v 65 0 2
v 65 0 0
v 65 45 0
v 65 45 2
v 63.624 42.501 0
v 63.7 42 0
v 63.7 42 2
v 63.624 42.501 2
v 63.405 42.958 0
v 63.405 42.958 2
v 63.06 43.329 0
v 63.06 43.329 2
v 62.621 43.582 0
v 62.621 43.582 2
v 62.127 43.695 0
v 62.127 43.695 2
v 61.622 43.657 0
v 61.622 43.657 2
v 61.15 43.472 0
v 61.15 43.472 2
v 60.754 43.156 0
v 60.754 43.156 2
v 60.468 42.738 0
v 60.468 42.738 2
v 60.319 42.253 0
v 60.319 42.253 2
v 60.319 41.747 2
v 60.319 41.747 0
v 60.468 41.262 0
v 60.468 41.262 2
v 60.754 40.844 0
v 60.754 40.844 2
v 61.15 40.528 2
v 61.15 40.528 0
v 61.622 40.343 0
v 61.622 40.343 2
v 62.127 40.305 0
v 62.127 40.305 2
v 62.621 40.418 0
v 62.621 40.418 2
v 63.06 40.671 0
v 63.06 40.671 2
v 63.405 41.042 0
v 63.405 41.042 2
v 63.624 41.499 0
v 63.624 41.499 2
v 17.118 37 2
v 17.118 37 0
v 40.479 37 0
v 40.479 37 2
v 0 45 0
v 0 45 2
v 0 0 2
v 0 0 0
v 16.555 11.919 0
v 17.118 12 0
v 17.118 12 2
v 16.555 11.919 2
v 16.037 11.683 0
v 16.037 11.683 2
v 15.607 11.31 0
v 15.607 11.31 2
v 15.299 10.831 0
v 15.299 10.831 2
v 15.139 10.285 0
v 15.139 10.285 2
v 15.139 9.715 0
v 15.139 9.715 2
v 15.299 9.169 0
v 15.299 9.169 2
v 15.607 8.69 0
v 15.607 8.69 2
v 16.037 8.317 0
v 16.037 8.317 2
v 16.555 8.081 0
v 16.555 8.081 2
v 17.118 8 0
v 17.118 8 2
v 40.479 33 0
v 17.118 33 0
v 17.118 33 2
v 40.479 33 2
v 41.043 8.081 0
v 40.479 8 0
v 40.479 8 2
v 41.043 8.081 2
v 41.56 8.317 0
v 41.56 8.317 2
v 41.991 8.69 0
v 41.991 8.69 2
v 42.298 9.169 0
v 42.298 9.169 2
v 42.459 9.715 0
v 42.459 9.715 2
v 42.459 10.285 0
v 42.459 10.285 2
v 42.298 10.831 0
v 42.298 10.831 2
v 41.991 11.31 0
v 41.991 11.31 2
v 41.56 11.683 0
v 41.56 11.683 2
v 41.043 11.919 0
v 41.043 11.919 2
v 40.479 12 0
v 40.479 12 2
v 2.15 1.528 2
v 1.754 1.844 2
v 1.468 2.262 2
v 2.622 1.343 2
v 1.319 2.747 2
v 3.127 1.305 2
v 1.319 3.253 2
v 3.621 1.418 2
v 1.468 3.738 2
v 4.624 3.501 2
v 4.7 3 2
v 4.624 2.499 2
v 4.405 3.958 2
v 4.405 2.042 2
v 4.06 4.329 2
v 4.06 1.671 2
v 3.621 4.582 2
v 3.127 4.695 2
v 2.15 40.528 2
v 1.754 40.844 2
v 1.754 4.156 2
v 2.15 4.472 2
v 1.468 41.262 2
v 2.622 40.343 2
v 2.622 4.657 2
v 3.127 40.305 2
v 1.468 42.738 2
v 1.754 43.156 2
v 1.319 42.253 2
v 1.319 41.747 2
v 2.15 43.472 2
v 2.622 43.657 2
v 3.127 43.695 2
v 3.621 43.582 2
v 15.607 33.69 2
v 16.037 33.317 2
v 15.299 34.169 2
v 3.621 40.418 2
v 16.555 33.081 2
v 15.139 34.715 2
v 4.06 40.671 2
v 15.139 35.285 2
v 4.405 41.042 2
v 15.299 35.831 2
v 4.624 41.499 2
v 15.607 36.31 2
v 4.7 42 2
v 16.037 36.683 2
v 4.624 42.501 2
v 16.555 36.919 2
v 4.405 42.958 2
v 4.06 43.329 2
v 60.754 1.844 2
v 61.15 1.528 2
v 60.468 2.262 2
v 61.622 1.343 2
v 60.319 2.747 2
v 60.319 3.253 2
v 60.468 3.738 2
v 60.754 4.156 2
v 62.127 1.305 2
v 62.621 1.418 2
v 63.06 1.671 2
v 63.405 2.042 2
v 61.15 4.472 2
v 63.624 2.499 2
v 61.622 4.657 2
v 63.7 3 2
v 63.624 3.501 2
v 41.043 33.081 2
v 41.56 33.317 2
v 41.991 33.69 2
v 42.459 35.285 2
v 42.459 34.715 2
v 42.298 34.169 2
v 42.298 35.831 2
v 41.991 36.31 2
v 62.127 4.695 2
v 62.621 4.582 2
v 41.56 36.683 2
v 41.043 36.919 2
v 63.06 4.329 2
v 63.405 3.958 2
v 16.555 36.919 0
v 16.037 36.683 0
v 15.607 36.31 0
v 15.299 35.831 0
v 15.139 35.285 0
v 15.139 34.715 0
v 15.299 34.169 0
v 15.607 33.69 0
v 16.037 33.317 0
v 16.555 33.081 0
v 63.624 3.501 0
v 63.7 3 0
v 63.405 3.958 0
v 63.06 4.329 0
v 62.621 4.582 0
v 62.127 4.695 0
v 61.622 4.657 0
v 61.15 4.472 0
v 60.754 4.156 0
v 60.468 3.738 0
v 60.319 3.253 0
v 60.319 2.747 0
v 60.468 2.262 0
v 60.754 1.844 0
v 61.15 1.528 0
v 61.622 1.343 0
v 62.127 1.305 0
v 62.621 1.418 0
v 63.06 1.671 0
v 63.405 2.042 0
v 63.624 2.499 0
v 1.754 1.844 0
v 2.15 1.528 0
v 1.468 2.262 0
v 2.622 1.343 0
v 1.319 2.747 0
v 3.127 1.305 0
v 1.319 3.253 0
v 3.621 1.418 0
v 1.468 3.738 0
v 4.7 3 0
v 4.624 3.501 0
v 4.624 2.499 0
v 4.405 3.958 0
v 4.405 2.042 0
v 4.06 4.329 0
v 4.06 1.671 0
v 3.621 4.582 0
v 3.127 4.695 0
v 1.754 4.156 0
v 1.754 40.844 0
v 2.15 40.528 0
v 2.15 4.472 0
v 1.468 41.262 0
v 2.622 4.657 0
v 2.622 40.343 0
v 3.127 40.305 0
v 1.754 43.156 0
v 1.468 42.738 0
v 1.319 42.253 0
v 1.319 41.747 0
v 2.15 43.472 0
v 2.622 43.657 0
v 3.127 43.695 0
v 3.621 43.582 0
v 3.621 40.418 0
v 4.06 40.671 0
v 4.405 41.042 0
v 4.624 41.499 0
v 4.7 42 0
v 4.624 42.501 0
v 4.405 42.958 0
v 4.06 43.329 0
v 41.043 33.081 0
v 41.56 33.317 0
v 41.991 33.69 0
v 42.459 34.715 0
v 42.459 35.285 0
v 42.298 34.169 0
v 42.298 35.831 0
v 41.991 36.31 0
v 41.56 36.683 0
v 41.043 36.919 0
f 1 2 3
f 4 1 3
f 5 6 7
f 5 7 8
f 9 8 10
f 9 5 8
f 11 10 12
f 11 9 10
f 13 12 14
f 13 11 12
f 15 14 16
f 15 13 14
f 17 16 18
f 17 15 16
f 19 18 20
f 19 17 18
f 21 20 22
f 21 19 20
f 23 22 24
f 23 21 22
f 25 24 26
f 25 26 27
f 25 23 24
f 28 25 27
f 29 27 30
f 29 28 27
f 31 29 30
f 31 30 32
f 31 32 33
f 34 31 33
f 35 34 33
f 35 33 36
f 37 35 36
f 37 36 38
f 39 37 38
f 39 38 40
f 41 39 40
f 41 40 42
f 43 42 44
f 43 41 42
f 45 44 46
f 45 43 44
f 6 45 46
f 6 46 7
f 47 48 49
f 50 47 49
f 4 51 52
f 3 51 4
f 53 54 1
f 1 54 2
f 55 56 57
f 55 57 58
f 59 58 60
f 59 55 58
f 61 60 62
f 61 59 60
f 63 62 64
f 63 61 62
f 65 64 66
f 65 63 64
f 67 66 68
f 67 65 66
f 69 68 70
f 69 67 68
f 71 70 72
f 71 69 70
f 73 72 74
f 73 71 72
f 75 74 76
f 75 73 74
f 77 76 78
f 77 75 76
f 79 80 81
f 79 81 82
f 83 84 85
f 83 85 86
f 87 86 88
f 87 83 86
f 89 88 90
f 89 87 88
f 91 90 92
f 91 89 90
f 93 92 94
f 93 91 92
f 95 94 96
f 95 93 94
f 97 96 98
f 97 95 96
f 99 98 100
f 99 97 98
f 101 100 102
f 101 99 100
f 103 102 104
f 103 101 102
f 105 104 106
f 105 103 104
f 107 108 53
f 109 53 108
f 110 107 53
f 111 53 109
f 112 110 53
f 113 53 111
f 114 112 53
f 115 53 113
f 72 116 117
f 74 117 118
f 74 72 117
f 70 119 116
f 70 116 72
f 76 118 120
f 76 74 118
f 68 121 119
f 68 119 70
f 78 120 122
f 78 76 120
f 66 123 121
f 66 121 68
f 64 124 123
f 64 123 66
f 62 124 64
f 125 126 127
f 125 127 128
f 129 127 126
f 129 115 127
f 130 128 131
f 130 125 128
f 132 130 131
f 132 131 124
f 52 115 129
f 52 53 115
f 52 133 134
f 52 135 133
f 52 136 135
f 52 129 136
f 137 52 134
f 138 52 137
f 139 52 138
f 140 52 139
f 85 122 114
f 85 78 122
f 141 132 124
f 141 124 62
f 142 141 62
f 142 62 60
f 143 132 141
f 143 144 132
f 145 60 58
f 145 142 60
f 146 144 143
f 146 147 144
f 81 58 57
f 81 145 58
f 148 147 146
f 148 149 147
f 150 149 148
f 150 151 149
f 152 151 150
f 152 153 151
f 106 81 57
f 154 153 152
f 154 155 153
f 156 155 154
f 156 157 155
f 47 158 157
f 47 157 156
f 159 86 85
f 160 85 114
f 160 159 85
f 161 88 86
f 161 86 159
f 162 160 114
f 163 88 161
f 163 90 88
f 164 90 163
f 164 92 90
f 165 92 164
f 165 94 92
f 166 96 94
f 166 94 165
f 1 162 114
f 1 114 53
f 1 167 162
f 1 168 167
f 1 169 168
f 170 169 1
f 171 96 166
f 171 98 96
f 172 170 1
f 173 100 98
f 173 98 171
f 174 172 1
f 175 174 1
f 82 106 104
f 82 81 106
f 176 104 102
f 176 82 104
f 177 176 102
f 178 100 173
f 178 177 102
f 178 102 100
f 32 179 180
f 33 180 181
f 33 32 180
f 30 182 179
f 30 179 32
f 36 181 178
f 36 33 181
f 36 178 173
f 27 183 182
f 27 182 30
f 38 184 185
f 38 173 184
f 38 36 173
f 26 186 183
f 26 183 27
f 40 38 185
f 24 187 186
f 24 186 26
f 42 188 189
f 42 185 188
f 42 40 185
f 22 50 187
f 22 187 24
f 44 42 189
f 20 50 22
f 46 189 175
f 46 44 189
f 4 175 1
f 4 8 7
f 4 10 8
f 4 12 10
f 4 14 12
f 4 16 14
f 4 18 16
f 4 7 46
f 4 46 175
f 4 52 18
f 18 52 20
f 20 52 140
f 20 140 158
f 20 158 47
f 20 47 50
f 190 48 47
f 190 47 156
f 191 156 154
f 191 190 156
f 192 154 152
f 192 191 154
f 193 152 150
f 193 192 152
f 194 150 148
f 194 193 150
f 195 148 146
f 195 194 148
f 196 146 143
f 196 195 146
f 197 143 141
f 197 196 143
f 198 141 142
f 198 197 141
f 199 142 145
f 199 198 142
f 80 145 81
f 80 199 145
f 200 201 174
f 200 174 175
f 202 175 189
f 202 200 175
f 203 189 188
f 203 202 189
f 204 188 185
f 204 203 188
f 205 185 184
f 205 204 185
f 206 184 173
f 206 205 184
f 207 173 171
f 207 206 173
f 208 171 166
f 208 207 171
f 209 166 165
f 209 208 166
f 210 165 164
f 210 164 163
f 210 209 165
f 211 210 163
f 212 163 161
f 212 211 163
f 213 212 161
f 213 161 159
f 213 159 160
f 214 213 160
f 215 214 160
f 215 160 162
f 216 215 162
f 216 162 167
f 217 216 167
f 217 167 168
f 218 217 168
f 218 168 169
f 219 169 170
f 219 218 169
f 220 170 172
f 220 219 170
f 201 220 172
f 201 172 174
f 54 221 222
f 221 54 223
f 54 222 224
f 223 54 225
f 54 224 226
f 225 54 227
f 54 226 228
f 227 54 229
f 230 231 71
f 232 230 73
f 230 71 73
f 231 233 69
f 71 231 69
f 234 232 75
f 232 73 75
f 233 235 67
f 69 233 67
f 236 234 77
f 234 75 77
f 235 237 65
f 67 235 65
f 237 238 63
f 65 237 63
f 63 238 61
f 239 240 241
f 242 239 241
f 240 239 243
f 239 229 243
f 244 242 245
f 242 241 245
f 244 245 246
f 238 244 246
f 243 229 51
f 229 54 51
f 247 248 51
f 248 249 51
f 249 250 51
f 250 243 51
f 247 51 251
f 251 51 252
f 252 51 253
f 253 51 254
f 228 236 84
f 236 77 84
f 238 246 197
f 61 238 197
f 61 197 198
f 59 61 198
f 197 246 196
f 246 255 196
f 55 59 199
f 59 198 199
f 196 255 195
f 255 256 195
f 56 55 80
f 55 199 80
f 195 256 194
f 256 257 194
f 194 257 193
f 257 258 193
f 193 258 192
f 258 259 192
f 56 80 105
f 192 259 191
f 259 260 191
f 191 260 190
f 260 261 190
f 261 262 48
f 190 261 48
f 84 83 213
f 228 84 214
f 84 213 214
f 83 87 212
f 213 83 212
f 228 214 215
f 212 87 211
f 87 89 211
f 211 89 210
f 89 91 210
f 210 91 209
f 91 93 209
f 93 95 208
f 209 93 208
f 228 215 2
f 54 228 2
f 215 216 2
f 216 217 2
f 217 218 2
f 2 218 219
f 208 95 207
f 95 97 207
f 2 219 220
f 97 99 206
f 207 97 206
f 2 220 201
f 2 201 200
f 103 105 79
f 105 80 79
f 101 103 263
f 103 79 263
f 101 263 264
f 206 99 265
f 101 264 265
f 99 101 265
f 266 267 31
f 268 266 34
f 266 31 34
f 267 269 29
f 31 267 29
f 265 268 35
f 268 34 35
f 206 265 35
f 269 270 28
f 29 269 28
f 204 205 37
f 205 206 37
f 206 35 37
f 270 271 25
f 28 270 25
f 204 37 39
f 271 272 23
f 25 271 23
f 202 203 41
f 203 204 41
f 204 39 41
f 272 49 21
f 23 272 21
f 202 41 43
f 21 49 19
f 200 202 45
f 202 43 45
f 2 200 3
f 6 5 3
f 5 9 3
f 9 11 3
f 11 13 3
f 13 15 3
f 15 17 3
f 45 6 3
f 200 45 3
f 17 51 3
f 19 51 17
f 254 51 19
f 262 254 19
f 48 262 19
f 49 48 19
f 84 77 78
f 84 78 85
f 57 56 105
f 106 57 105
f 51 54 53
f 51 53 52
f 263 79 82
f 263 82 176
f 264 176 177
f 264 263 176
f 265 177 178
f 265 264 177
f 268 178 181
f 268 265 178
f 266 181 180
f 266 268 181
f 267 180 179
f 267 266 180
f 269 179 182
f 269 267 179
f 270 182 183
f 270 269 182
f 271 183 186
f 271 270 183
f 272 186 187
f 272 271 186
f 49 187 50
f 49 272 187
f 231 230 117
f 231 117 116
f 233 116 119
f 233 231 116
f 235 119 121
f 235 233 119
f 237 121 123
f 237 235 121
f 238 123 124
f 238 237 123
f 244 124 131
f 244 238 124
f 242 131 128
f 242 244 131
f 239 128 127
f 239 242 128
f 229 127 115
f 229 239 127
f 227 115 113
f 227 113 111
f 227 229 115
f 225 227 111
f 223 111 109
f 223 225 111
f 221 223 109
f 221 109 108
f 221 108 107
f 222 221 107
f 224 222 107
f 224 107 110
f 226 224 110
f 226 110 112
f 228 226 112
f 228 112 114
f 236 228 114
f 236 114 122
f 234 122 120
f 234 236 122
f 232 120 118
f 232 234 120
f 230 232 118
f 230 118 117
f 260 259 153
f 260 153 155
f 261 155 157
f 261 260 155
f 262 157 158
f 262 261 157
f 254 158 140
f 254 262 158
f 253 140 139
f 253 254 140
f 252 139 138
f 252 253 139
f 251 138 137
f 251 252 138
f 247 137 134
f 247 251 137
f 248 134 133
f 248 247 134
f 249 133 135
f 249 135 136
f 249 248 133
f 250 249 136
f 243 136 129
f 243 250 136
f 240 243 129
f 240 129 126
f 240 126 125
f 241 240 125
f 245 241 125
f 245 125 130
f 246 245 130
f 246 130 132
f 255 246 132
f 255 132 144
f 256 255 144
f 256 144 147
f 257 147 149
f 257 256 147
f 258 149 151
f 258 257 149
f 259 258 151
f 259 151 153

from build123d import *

# Parameters (mm, degrees)
SKETCH_W  = 65
SKETCH_H  = 45
SKETCH_R  = 1.7
PAD_DEPTH = 2


with BuildPart() as part:
    # Sketch → Pad (new body)
    with BuildSketch(Plane.XY):
        with Locations((32.5, 22.5)):
            Rectangle(SKETCH_W, SKETCH_H)
        with Locations((3, 42)):
            Circle(SKETCH_R, mode=Mode.SUBTRACT)
        with Locations((62, 42)):
            Circle(SKETCH_R, mode=Mode.SUBTRACT)
        with Locations((3, 3)):
            Circle(SKETCH_R, mode=Mode.SUBTRACT)
        with Locations((62, 3)):
            Circle(SKETCH_R, mode=Mode.SUBTRACT)
        with BuildLine():
            ThreePointArc((17.118392, 37), (15.118392, 35), (17.118392, 33))
            Line((17.118392, 33), (40.47904, 33))
            ThreePointArc((40.47904, 33), (42.47904, 35), (40.47904, 37))
            Line((17.118392, 37), (40.47904, 37))
        make_face(mode=Mode.SUBTRACT)
        with BuildLine():
            ThreePointArc((17.118392, 12), (15.118392, 10), (17.118392, 8))
            Line((17.118392, 8), (40.47904, 8))
            ThreePointArc((40.47904, 8), (42.47904, 10), (40.47904, 12))
            Line((17.118392, 12), (40.47904, 12))
        make_face(mode=Mode.SUBTRACT)
    extrude(amount=PAD_DEPTH)


solid = part.part
